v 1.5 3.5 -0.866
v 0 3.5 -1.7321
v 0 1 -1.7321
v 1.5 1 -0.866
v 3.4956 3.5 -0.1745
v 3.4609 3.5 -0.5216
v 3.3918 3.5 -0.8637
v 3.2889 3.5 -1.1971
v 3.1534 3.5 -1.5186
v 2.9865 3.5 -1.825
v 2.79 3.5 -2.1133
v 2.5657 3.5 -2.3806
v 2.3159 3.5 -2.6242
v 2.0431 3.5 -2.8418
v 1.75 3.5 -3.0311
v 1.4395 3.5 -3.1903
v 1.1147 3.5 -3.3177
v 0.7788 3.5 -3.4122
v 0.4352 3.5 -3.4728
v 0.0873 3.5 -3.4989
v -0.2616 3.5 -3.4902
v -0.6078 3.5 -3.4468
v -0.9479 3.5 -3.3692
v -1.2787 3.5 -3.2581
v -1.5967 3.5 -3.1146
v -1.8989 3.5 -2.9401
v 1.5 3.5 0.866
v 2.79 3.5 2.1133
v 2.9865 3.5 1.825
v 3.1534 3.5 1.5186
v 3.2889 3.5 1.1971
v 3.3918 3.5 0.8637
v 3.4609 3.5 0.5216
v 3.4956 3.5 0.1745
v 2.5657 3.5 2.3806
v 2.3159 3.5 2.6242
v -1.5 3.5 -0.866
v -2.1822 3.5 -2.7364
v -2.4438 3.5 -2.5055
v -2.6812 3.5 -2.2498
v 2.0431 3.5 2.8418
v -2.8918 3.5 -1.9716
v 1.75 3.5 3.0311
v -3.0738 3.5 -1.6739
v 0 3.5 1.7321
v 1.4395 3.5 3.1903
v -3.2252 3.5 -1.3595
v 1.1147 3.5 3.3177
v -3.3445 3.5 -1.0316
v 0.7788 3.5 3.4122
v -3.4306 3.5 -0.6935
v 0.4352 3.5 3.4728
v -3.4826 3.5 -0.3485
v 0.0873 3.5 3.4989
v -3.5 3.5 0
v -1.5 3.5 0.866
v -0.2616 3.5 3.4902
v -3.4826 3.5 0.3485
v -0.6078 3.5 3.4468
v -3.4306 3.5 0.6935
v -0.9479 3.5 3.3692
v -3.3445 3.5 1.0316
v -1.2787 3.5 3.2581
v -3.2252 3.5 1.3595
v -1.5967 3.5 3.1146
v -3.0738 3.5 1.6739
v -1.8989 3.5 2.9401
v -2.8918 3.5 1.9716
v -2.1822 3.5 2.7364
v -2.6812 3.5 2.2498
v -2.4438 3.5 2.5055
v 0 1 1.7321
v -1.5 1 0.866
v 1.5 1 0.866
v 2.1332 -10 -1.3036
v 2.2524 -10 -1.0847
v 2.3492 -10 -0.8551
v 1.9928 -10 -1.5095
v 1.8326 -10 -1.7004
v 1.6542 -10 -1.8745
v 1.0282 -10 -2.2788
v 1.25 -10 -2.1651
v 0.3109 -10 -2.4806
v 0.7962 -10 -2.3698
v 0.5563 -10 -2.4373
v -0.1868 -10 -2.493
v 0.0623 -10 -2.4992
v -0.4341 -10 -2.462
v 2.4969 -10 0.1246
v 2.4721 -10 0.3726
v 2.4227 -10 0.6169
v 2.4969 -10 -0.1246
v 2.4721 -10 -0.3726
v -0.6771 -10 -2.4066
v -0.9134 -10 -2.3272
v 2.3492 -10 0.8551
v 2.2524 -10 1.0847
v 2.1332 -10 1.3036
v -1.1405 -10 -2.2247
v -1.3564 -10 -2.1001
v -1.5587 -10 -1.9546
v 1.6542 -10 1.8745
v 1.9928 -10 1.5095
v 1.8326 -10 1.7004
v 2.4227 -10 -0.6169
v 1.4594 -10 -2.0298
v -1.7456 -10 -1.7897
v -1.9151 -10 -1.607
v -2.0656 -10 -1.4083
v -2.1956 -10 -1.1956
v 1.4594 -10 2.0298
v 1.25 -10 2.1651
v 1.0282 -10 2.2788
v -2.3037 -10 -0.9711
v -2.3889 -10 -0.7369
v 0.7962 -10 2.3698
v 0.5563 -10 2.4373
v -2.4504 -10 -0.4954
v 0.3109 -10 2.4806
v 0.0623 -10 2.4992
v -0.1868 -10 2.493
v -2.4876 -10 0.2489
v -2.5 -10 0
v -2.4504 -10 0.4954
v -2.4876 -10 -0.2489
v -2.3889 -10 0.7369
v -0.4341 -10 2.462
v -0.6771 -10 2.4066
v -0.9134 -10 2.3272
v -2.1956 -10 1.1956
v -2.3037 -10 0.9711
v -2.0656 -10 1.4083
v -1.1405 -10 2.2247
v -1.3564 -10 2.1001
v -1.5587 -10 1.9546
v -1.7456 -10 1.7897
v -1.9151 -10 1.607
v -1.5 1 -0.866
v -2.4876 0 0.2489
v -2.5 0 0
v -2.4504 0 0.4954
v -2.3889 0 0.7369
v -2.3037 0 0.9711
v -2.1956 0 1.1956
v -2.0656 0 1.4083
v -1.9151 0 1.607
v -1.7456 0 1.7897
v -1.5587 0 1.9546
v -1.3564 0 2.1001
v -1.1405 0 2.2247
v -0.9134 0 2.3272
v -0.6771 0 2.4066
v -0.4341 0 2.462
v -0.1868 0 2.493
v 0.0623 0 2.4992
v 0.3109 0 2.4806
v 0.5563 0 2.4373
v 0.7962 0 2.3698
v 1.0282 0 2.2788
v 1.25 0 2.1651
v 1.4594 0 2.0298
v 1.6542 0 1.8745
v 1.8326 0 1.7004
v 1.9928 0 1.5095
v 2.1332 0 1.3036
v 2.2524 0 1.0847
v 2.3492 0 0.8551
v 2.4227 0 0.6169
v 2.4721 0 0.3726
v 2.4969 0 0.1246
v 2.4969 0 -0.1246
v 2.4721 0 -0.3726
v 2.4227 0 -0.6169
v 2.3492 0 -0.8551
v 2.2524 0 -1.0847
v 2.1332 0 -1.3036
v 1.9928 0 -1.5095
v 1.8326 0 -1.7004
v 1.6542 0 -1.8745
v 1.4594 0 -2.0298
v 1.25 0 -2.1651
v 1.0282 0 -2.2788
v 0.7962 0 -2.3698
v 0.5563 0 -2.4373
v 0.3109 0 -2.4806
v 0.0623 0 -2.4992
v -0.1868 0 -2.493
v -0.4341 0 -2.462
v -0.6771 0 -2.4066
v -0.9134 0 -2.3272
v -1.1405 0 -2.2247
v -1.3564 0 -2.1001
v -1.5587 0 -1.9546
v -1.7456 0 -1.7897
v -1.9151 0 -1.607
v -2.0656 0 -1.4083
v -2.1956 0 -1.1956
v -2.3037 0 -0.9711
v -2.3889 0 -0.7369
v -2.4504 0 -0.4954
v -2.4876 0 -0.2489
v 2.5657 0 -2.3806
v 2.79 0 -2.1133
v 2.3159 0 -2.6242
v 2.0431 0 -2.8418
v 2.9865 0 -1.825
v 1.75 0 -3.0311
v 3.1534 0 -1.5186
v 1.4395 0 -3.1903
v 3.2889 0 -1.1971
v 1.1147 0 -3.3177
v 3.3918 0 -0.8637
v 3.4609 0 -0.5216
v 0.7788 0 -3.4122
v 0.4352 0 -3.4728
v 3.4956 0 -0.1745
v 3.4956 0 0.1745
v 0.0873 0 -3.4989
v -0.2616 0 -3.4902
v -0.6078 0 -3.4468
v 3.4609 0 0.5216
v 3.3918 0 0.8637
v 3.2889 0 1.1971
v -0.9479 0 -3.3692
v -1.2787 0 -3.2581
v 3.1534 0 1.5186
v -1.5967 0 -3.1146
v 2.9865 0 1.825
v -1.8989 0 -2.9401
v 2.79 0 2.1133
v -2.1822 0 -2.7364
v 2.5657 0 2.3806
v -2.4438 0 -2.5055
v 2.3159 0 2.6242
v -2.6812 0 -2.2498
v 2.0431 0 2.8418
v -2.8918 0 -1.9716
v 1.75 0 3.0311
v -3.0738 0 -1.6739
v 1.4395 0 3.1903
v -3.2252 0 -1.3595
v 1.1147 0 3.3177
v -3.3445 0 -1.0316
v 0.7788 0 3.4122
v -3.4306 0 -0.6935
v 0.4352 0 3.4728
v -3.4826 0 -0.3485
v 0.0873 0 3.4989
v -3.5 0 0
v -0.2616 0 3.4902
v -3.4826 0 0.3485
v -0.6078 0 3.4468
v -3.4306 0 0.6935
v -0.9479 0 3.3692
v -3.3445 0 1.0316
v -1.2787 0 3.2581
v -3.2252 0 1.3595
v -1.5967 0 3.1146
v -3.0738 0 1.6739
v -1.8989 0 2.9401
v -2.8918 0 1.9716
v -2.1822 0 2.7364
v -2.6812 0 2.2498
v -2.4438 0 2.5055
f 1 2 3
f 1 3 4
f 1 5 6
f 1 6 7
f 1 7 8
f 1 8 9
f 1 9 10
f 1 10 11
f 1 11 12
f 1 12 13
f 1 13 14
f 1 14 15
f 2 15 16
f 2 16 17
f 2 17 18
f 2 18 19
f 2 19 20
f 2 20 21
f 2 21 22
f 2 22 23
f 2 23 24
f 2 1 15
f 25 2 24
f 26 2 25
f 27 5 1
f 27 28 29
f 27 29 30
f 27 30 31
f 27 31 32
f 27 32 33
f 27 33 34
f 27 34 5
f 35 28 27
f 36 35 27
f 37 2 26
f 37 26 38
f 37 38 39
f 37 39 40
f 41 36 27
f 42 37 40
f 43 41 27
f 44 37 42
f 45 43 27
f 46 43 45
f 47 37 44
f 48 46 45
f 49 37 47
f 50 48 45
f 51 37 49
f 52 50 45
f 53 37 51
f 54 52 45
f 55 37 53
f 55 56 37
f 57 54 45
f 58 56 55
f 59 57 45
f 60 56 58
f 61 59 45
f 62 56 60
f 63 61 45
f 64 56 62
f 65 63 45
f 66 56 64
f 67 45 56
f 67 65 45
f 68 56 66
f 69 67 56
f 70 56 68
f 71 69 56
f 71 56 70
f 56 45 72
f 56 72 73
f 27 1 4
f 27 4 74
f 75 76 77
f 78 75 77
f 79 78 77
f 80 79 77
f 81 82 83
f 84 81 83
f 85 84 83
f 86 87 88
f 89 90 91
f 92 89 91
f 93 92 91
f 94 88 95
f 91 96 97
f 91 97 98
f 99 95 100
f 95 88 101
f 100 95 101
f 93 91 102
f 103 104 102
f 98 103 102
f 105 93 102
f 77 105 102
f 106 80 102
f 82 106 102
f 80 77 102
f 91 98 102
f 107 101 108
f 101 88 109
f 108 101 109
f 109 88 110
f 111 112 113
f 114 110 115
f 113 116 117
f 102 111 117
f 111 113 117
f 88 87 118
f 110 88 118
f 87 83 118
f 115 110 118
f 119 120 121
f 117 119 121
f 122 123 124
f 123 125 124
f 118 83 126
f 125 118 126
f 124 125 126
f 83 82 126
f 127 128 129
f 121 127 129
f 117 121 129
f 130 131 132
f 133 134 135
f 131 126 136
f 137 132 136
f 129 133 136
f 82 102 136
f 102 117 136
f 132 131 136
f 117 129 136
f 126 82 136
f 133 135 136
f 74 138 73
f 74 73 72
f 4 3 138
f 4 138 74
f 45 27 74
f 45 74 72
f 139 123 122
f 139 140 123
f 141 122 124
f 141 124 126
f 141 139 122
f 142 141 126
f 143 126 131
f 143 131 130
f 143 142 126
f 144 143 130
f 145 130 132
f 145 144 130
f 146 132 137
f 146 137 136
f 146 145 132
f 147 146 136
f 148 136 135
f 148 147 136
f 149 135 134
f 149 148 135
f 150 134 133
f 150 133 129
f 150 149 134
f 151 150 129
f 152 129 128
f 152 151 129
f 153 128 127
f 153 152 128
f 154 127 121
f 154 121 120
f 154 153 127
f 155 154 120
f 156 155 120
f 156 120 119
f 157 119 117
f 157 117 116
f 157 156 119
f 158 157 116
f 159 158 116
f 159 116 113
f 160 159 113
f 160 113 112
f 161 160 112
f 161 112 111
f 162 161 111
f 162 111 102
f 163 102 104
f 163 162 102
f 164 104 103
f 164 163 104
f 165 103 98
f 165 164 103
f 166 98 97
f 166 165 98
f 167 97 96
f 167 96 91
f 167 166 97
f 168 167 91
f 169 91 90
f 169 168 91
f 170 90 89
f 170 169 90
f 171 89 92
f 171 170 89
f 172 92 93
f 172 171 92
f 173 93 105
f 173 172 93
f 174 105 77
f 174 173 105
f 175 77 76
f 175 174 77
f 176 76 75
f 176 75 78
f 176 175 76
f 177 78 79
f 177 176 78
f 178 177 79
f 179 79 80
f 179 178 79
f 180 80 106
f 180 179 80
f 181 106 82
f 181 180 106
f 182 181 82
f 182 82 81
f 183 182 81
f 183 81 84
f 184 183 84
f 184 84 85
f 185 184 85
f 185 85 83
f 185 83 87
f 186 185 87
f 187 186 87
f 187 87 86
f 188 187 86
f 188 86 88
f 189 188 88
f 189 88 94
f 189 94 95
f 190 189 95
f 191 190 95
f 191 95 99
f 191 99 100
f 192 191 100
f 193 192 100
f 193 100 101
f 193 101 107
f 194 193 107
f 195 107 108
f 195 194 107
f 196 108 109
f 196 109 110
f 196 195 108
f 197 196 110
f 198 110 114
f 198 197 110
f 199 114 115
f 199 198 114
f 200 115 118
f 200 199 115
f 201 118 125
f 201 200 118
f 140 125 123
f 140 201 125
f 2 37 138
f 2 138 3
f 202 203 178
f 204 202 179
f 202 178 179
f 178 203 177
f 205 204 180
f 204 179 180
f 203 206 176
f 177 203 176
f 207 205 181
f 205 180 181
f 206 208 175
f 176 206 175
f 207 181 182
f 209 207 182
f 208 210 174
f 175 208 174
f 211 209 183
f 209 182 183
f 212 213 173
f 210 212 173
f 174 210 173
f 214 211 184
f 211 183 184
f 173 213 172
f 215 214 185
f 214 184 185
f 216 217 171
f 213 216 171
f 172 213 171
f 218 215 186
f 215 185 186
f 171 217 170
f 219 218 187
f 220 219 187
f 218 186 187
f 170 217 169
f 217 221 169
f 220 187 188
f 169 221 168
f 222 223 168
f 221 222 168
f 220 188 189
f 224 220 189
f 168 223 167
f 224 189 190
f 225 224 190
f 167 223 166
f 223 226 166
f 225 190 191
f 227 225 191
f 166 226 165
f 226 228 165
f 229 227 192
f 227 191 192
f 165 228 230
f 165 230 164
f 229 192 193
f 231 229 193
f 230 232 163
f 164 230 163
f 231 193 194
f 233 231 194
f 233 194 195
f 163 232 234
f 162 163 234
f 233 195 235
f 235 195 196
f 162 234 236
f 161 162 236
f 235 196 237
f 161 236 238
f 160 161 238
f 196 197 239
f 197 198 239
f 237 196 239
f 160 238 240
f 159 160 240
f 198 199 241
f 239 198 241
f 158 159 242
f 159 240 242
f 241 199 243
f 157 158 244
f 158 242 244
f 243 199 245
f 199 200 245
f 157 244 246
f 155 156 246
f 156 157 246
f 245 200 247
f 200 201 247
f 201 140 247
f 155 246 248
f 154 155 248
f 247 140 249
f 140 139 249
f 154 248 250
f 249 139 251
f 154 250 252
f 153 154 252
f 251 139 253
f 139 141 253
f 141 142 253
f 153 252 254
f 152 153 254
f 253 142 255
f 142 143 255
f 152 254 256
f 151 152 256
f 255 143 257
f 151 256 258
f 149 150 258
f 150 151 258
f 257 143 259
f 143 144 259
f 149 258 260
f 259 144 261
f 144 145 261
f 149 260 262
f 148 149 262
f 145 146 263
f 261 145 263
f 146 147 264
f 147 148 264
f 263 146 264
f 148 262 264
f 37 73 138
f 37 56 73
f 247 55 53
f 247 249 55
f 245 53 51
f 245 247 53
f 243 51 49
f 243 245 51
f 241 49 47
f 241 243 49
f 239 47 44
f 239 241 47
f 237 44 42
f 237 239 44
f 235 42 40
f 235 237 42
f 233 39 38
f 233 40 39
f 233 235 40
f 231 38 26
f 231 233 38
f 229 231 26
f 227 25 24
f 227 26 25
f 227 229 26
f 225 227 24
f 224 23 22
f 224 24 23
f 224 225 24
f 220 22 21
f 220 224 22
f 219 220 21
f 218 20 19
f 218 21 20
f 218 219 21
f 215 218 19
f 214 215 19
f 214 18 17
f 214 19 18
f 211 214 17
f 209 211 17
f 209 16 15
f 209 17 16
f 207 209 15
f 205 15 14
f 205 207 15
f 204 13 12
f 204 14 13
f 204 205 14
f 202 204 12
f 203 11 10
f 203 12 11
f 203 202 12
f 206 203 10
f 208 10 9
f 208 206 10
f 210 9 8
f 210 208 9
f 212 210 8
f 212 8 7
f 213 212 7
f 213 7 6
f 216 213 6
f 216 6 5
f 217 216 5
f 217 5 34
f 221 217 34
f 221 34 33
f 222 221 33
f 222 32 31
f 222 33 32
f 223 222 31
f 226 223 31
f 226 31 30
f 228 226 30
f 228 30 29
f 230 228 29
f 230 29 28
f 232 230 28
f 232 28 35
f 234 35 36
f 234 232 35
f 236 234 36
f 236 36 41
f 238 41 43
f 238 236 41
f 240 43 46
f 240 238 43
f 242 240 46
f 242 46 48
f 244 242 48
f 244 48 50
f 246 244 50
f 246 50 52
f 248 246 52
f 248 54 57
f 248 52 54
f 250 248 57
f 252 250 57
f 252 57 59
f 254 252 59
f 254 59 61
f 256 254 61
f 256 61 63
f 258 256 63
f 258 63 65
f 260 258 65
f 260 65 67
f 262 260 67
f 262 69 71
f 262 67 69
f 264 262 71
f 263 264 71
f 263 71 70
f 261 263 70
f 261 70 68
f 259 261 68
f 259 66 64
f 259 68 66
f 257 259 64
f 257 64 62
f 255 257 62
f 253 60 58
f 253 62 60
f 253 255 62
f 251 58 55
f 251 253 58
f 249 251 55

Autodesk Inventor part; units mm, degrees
ref_plane "YZ Plane" through (0, 0, 0) normal (1, 0, 0) x (0, 1, 0)
ref_plane "XZ Plane" through (0, 0, 0) normal (0, 1, 0) x (-1, 0, 0)
ref_plane "XY Plane" through (0, 0, 0) normal (0, 0, 1) x (1, 0, 0)
sketch "Sketch1" plane through (0, 0, 0) normal (0, 1, 0) x (-1, 0, 0)
  circle A0 centre (0, 0) radius 3.5
  circle A1 centre (0, 0) radius 2.5
  dimension "d0" = 7
  dimension "d1" = 5
extrude "Extrusion1" add sketch "Sketch1" against normal blind 10 contours A1
extrude "Extrusion2" add sketch "Sketch1" along normal blind 3.5 contours A0 | A1
sketch "Sketch2" plane through (0, 3.5, 0) normal (0, 1, 0) x (1, 0, 0)
  circle A0 centre (0, 0) radius 2.5 projected
  line L0 (-1.5, -0.866) -> (-1.5, 0.866)
  line L1 (-1.5, 0.866) -> (0, 1.7321)
  line L2 (0, 1.7321) -> (1.5, 0.866)
  line L3 (1.5, 0.866) -> (1.5, -0.866)
  line L4 (1.5, -0.866) -> (0, -1.7321)
  line L5 (0, -1.7321) -> (-1.5, -0.866)
  dimension "d6" = 3
extrude "Extrusion3" cut sketch "Sketch2" against normal blind 2.5 contours L0 L1 L2 L3 L4 L5
equation "\"d0\" = D_"
equation "\"d1\" = M_"
equation "\"d2\" = L_"
equation "\"d4\" = K_"
equation "\"d6\" = S_"
equation "\"d7\" = t_"
equation "\"K_\" = 3.5"
equation "\"D_\" = 7"
equation "\"S_\" = 3"
equation "\"t_\" = 2.5"
equation "\"M_\" = 5"
equation "\"L_\" = 10"
properties part number "M5 x 10" material "Stainless Steel"
